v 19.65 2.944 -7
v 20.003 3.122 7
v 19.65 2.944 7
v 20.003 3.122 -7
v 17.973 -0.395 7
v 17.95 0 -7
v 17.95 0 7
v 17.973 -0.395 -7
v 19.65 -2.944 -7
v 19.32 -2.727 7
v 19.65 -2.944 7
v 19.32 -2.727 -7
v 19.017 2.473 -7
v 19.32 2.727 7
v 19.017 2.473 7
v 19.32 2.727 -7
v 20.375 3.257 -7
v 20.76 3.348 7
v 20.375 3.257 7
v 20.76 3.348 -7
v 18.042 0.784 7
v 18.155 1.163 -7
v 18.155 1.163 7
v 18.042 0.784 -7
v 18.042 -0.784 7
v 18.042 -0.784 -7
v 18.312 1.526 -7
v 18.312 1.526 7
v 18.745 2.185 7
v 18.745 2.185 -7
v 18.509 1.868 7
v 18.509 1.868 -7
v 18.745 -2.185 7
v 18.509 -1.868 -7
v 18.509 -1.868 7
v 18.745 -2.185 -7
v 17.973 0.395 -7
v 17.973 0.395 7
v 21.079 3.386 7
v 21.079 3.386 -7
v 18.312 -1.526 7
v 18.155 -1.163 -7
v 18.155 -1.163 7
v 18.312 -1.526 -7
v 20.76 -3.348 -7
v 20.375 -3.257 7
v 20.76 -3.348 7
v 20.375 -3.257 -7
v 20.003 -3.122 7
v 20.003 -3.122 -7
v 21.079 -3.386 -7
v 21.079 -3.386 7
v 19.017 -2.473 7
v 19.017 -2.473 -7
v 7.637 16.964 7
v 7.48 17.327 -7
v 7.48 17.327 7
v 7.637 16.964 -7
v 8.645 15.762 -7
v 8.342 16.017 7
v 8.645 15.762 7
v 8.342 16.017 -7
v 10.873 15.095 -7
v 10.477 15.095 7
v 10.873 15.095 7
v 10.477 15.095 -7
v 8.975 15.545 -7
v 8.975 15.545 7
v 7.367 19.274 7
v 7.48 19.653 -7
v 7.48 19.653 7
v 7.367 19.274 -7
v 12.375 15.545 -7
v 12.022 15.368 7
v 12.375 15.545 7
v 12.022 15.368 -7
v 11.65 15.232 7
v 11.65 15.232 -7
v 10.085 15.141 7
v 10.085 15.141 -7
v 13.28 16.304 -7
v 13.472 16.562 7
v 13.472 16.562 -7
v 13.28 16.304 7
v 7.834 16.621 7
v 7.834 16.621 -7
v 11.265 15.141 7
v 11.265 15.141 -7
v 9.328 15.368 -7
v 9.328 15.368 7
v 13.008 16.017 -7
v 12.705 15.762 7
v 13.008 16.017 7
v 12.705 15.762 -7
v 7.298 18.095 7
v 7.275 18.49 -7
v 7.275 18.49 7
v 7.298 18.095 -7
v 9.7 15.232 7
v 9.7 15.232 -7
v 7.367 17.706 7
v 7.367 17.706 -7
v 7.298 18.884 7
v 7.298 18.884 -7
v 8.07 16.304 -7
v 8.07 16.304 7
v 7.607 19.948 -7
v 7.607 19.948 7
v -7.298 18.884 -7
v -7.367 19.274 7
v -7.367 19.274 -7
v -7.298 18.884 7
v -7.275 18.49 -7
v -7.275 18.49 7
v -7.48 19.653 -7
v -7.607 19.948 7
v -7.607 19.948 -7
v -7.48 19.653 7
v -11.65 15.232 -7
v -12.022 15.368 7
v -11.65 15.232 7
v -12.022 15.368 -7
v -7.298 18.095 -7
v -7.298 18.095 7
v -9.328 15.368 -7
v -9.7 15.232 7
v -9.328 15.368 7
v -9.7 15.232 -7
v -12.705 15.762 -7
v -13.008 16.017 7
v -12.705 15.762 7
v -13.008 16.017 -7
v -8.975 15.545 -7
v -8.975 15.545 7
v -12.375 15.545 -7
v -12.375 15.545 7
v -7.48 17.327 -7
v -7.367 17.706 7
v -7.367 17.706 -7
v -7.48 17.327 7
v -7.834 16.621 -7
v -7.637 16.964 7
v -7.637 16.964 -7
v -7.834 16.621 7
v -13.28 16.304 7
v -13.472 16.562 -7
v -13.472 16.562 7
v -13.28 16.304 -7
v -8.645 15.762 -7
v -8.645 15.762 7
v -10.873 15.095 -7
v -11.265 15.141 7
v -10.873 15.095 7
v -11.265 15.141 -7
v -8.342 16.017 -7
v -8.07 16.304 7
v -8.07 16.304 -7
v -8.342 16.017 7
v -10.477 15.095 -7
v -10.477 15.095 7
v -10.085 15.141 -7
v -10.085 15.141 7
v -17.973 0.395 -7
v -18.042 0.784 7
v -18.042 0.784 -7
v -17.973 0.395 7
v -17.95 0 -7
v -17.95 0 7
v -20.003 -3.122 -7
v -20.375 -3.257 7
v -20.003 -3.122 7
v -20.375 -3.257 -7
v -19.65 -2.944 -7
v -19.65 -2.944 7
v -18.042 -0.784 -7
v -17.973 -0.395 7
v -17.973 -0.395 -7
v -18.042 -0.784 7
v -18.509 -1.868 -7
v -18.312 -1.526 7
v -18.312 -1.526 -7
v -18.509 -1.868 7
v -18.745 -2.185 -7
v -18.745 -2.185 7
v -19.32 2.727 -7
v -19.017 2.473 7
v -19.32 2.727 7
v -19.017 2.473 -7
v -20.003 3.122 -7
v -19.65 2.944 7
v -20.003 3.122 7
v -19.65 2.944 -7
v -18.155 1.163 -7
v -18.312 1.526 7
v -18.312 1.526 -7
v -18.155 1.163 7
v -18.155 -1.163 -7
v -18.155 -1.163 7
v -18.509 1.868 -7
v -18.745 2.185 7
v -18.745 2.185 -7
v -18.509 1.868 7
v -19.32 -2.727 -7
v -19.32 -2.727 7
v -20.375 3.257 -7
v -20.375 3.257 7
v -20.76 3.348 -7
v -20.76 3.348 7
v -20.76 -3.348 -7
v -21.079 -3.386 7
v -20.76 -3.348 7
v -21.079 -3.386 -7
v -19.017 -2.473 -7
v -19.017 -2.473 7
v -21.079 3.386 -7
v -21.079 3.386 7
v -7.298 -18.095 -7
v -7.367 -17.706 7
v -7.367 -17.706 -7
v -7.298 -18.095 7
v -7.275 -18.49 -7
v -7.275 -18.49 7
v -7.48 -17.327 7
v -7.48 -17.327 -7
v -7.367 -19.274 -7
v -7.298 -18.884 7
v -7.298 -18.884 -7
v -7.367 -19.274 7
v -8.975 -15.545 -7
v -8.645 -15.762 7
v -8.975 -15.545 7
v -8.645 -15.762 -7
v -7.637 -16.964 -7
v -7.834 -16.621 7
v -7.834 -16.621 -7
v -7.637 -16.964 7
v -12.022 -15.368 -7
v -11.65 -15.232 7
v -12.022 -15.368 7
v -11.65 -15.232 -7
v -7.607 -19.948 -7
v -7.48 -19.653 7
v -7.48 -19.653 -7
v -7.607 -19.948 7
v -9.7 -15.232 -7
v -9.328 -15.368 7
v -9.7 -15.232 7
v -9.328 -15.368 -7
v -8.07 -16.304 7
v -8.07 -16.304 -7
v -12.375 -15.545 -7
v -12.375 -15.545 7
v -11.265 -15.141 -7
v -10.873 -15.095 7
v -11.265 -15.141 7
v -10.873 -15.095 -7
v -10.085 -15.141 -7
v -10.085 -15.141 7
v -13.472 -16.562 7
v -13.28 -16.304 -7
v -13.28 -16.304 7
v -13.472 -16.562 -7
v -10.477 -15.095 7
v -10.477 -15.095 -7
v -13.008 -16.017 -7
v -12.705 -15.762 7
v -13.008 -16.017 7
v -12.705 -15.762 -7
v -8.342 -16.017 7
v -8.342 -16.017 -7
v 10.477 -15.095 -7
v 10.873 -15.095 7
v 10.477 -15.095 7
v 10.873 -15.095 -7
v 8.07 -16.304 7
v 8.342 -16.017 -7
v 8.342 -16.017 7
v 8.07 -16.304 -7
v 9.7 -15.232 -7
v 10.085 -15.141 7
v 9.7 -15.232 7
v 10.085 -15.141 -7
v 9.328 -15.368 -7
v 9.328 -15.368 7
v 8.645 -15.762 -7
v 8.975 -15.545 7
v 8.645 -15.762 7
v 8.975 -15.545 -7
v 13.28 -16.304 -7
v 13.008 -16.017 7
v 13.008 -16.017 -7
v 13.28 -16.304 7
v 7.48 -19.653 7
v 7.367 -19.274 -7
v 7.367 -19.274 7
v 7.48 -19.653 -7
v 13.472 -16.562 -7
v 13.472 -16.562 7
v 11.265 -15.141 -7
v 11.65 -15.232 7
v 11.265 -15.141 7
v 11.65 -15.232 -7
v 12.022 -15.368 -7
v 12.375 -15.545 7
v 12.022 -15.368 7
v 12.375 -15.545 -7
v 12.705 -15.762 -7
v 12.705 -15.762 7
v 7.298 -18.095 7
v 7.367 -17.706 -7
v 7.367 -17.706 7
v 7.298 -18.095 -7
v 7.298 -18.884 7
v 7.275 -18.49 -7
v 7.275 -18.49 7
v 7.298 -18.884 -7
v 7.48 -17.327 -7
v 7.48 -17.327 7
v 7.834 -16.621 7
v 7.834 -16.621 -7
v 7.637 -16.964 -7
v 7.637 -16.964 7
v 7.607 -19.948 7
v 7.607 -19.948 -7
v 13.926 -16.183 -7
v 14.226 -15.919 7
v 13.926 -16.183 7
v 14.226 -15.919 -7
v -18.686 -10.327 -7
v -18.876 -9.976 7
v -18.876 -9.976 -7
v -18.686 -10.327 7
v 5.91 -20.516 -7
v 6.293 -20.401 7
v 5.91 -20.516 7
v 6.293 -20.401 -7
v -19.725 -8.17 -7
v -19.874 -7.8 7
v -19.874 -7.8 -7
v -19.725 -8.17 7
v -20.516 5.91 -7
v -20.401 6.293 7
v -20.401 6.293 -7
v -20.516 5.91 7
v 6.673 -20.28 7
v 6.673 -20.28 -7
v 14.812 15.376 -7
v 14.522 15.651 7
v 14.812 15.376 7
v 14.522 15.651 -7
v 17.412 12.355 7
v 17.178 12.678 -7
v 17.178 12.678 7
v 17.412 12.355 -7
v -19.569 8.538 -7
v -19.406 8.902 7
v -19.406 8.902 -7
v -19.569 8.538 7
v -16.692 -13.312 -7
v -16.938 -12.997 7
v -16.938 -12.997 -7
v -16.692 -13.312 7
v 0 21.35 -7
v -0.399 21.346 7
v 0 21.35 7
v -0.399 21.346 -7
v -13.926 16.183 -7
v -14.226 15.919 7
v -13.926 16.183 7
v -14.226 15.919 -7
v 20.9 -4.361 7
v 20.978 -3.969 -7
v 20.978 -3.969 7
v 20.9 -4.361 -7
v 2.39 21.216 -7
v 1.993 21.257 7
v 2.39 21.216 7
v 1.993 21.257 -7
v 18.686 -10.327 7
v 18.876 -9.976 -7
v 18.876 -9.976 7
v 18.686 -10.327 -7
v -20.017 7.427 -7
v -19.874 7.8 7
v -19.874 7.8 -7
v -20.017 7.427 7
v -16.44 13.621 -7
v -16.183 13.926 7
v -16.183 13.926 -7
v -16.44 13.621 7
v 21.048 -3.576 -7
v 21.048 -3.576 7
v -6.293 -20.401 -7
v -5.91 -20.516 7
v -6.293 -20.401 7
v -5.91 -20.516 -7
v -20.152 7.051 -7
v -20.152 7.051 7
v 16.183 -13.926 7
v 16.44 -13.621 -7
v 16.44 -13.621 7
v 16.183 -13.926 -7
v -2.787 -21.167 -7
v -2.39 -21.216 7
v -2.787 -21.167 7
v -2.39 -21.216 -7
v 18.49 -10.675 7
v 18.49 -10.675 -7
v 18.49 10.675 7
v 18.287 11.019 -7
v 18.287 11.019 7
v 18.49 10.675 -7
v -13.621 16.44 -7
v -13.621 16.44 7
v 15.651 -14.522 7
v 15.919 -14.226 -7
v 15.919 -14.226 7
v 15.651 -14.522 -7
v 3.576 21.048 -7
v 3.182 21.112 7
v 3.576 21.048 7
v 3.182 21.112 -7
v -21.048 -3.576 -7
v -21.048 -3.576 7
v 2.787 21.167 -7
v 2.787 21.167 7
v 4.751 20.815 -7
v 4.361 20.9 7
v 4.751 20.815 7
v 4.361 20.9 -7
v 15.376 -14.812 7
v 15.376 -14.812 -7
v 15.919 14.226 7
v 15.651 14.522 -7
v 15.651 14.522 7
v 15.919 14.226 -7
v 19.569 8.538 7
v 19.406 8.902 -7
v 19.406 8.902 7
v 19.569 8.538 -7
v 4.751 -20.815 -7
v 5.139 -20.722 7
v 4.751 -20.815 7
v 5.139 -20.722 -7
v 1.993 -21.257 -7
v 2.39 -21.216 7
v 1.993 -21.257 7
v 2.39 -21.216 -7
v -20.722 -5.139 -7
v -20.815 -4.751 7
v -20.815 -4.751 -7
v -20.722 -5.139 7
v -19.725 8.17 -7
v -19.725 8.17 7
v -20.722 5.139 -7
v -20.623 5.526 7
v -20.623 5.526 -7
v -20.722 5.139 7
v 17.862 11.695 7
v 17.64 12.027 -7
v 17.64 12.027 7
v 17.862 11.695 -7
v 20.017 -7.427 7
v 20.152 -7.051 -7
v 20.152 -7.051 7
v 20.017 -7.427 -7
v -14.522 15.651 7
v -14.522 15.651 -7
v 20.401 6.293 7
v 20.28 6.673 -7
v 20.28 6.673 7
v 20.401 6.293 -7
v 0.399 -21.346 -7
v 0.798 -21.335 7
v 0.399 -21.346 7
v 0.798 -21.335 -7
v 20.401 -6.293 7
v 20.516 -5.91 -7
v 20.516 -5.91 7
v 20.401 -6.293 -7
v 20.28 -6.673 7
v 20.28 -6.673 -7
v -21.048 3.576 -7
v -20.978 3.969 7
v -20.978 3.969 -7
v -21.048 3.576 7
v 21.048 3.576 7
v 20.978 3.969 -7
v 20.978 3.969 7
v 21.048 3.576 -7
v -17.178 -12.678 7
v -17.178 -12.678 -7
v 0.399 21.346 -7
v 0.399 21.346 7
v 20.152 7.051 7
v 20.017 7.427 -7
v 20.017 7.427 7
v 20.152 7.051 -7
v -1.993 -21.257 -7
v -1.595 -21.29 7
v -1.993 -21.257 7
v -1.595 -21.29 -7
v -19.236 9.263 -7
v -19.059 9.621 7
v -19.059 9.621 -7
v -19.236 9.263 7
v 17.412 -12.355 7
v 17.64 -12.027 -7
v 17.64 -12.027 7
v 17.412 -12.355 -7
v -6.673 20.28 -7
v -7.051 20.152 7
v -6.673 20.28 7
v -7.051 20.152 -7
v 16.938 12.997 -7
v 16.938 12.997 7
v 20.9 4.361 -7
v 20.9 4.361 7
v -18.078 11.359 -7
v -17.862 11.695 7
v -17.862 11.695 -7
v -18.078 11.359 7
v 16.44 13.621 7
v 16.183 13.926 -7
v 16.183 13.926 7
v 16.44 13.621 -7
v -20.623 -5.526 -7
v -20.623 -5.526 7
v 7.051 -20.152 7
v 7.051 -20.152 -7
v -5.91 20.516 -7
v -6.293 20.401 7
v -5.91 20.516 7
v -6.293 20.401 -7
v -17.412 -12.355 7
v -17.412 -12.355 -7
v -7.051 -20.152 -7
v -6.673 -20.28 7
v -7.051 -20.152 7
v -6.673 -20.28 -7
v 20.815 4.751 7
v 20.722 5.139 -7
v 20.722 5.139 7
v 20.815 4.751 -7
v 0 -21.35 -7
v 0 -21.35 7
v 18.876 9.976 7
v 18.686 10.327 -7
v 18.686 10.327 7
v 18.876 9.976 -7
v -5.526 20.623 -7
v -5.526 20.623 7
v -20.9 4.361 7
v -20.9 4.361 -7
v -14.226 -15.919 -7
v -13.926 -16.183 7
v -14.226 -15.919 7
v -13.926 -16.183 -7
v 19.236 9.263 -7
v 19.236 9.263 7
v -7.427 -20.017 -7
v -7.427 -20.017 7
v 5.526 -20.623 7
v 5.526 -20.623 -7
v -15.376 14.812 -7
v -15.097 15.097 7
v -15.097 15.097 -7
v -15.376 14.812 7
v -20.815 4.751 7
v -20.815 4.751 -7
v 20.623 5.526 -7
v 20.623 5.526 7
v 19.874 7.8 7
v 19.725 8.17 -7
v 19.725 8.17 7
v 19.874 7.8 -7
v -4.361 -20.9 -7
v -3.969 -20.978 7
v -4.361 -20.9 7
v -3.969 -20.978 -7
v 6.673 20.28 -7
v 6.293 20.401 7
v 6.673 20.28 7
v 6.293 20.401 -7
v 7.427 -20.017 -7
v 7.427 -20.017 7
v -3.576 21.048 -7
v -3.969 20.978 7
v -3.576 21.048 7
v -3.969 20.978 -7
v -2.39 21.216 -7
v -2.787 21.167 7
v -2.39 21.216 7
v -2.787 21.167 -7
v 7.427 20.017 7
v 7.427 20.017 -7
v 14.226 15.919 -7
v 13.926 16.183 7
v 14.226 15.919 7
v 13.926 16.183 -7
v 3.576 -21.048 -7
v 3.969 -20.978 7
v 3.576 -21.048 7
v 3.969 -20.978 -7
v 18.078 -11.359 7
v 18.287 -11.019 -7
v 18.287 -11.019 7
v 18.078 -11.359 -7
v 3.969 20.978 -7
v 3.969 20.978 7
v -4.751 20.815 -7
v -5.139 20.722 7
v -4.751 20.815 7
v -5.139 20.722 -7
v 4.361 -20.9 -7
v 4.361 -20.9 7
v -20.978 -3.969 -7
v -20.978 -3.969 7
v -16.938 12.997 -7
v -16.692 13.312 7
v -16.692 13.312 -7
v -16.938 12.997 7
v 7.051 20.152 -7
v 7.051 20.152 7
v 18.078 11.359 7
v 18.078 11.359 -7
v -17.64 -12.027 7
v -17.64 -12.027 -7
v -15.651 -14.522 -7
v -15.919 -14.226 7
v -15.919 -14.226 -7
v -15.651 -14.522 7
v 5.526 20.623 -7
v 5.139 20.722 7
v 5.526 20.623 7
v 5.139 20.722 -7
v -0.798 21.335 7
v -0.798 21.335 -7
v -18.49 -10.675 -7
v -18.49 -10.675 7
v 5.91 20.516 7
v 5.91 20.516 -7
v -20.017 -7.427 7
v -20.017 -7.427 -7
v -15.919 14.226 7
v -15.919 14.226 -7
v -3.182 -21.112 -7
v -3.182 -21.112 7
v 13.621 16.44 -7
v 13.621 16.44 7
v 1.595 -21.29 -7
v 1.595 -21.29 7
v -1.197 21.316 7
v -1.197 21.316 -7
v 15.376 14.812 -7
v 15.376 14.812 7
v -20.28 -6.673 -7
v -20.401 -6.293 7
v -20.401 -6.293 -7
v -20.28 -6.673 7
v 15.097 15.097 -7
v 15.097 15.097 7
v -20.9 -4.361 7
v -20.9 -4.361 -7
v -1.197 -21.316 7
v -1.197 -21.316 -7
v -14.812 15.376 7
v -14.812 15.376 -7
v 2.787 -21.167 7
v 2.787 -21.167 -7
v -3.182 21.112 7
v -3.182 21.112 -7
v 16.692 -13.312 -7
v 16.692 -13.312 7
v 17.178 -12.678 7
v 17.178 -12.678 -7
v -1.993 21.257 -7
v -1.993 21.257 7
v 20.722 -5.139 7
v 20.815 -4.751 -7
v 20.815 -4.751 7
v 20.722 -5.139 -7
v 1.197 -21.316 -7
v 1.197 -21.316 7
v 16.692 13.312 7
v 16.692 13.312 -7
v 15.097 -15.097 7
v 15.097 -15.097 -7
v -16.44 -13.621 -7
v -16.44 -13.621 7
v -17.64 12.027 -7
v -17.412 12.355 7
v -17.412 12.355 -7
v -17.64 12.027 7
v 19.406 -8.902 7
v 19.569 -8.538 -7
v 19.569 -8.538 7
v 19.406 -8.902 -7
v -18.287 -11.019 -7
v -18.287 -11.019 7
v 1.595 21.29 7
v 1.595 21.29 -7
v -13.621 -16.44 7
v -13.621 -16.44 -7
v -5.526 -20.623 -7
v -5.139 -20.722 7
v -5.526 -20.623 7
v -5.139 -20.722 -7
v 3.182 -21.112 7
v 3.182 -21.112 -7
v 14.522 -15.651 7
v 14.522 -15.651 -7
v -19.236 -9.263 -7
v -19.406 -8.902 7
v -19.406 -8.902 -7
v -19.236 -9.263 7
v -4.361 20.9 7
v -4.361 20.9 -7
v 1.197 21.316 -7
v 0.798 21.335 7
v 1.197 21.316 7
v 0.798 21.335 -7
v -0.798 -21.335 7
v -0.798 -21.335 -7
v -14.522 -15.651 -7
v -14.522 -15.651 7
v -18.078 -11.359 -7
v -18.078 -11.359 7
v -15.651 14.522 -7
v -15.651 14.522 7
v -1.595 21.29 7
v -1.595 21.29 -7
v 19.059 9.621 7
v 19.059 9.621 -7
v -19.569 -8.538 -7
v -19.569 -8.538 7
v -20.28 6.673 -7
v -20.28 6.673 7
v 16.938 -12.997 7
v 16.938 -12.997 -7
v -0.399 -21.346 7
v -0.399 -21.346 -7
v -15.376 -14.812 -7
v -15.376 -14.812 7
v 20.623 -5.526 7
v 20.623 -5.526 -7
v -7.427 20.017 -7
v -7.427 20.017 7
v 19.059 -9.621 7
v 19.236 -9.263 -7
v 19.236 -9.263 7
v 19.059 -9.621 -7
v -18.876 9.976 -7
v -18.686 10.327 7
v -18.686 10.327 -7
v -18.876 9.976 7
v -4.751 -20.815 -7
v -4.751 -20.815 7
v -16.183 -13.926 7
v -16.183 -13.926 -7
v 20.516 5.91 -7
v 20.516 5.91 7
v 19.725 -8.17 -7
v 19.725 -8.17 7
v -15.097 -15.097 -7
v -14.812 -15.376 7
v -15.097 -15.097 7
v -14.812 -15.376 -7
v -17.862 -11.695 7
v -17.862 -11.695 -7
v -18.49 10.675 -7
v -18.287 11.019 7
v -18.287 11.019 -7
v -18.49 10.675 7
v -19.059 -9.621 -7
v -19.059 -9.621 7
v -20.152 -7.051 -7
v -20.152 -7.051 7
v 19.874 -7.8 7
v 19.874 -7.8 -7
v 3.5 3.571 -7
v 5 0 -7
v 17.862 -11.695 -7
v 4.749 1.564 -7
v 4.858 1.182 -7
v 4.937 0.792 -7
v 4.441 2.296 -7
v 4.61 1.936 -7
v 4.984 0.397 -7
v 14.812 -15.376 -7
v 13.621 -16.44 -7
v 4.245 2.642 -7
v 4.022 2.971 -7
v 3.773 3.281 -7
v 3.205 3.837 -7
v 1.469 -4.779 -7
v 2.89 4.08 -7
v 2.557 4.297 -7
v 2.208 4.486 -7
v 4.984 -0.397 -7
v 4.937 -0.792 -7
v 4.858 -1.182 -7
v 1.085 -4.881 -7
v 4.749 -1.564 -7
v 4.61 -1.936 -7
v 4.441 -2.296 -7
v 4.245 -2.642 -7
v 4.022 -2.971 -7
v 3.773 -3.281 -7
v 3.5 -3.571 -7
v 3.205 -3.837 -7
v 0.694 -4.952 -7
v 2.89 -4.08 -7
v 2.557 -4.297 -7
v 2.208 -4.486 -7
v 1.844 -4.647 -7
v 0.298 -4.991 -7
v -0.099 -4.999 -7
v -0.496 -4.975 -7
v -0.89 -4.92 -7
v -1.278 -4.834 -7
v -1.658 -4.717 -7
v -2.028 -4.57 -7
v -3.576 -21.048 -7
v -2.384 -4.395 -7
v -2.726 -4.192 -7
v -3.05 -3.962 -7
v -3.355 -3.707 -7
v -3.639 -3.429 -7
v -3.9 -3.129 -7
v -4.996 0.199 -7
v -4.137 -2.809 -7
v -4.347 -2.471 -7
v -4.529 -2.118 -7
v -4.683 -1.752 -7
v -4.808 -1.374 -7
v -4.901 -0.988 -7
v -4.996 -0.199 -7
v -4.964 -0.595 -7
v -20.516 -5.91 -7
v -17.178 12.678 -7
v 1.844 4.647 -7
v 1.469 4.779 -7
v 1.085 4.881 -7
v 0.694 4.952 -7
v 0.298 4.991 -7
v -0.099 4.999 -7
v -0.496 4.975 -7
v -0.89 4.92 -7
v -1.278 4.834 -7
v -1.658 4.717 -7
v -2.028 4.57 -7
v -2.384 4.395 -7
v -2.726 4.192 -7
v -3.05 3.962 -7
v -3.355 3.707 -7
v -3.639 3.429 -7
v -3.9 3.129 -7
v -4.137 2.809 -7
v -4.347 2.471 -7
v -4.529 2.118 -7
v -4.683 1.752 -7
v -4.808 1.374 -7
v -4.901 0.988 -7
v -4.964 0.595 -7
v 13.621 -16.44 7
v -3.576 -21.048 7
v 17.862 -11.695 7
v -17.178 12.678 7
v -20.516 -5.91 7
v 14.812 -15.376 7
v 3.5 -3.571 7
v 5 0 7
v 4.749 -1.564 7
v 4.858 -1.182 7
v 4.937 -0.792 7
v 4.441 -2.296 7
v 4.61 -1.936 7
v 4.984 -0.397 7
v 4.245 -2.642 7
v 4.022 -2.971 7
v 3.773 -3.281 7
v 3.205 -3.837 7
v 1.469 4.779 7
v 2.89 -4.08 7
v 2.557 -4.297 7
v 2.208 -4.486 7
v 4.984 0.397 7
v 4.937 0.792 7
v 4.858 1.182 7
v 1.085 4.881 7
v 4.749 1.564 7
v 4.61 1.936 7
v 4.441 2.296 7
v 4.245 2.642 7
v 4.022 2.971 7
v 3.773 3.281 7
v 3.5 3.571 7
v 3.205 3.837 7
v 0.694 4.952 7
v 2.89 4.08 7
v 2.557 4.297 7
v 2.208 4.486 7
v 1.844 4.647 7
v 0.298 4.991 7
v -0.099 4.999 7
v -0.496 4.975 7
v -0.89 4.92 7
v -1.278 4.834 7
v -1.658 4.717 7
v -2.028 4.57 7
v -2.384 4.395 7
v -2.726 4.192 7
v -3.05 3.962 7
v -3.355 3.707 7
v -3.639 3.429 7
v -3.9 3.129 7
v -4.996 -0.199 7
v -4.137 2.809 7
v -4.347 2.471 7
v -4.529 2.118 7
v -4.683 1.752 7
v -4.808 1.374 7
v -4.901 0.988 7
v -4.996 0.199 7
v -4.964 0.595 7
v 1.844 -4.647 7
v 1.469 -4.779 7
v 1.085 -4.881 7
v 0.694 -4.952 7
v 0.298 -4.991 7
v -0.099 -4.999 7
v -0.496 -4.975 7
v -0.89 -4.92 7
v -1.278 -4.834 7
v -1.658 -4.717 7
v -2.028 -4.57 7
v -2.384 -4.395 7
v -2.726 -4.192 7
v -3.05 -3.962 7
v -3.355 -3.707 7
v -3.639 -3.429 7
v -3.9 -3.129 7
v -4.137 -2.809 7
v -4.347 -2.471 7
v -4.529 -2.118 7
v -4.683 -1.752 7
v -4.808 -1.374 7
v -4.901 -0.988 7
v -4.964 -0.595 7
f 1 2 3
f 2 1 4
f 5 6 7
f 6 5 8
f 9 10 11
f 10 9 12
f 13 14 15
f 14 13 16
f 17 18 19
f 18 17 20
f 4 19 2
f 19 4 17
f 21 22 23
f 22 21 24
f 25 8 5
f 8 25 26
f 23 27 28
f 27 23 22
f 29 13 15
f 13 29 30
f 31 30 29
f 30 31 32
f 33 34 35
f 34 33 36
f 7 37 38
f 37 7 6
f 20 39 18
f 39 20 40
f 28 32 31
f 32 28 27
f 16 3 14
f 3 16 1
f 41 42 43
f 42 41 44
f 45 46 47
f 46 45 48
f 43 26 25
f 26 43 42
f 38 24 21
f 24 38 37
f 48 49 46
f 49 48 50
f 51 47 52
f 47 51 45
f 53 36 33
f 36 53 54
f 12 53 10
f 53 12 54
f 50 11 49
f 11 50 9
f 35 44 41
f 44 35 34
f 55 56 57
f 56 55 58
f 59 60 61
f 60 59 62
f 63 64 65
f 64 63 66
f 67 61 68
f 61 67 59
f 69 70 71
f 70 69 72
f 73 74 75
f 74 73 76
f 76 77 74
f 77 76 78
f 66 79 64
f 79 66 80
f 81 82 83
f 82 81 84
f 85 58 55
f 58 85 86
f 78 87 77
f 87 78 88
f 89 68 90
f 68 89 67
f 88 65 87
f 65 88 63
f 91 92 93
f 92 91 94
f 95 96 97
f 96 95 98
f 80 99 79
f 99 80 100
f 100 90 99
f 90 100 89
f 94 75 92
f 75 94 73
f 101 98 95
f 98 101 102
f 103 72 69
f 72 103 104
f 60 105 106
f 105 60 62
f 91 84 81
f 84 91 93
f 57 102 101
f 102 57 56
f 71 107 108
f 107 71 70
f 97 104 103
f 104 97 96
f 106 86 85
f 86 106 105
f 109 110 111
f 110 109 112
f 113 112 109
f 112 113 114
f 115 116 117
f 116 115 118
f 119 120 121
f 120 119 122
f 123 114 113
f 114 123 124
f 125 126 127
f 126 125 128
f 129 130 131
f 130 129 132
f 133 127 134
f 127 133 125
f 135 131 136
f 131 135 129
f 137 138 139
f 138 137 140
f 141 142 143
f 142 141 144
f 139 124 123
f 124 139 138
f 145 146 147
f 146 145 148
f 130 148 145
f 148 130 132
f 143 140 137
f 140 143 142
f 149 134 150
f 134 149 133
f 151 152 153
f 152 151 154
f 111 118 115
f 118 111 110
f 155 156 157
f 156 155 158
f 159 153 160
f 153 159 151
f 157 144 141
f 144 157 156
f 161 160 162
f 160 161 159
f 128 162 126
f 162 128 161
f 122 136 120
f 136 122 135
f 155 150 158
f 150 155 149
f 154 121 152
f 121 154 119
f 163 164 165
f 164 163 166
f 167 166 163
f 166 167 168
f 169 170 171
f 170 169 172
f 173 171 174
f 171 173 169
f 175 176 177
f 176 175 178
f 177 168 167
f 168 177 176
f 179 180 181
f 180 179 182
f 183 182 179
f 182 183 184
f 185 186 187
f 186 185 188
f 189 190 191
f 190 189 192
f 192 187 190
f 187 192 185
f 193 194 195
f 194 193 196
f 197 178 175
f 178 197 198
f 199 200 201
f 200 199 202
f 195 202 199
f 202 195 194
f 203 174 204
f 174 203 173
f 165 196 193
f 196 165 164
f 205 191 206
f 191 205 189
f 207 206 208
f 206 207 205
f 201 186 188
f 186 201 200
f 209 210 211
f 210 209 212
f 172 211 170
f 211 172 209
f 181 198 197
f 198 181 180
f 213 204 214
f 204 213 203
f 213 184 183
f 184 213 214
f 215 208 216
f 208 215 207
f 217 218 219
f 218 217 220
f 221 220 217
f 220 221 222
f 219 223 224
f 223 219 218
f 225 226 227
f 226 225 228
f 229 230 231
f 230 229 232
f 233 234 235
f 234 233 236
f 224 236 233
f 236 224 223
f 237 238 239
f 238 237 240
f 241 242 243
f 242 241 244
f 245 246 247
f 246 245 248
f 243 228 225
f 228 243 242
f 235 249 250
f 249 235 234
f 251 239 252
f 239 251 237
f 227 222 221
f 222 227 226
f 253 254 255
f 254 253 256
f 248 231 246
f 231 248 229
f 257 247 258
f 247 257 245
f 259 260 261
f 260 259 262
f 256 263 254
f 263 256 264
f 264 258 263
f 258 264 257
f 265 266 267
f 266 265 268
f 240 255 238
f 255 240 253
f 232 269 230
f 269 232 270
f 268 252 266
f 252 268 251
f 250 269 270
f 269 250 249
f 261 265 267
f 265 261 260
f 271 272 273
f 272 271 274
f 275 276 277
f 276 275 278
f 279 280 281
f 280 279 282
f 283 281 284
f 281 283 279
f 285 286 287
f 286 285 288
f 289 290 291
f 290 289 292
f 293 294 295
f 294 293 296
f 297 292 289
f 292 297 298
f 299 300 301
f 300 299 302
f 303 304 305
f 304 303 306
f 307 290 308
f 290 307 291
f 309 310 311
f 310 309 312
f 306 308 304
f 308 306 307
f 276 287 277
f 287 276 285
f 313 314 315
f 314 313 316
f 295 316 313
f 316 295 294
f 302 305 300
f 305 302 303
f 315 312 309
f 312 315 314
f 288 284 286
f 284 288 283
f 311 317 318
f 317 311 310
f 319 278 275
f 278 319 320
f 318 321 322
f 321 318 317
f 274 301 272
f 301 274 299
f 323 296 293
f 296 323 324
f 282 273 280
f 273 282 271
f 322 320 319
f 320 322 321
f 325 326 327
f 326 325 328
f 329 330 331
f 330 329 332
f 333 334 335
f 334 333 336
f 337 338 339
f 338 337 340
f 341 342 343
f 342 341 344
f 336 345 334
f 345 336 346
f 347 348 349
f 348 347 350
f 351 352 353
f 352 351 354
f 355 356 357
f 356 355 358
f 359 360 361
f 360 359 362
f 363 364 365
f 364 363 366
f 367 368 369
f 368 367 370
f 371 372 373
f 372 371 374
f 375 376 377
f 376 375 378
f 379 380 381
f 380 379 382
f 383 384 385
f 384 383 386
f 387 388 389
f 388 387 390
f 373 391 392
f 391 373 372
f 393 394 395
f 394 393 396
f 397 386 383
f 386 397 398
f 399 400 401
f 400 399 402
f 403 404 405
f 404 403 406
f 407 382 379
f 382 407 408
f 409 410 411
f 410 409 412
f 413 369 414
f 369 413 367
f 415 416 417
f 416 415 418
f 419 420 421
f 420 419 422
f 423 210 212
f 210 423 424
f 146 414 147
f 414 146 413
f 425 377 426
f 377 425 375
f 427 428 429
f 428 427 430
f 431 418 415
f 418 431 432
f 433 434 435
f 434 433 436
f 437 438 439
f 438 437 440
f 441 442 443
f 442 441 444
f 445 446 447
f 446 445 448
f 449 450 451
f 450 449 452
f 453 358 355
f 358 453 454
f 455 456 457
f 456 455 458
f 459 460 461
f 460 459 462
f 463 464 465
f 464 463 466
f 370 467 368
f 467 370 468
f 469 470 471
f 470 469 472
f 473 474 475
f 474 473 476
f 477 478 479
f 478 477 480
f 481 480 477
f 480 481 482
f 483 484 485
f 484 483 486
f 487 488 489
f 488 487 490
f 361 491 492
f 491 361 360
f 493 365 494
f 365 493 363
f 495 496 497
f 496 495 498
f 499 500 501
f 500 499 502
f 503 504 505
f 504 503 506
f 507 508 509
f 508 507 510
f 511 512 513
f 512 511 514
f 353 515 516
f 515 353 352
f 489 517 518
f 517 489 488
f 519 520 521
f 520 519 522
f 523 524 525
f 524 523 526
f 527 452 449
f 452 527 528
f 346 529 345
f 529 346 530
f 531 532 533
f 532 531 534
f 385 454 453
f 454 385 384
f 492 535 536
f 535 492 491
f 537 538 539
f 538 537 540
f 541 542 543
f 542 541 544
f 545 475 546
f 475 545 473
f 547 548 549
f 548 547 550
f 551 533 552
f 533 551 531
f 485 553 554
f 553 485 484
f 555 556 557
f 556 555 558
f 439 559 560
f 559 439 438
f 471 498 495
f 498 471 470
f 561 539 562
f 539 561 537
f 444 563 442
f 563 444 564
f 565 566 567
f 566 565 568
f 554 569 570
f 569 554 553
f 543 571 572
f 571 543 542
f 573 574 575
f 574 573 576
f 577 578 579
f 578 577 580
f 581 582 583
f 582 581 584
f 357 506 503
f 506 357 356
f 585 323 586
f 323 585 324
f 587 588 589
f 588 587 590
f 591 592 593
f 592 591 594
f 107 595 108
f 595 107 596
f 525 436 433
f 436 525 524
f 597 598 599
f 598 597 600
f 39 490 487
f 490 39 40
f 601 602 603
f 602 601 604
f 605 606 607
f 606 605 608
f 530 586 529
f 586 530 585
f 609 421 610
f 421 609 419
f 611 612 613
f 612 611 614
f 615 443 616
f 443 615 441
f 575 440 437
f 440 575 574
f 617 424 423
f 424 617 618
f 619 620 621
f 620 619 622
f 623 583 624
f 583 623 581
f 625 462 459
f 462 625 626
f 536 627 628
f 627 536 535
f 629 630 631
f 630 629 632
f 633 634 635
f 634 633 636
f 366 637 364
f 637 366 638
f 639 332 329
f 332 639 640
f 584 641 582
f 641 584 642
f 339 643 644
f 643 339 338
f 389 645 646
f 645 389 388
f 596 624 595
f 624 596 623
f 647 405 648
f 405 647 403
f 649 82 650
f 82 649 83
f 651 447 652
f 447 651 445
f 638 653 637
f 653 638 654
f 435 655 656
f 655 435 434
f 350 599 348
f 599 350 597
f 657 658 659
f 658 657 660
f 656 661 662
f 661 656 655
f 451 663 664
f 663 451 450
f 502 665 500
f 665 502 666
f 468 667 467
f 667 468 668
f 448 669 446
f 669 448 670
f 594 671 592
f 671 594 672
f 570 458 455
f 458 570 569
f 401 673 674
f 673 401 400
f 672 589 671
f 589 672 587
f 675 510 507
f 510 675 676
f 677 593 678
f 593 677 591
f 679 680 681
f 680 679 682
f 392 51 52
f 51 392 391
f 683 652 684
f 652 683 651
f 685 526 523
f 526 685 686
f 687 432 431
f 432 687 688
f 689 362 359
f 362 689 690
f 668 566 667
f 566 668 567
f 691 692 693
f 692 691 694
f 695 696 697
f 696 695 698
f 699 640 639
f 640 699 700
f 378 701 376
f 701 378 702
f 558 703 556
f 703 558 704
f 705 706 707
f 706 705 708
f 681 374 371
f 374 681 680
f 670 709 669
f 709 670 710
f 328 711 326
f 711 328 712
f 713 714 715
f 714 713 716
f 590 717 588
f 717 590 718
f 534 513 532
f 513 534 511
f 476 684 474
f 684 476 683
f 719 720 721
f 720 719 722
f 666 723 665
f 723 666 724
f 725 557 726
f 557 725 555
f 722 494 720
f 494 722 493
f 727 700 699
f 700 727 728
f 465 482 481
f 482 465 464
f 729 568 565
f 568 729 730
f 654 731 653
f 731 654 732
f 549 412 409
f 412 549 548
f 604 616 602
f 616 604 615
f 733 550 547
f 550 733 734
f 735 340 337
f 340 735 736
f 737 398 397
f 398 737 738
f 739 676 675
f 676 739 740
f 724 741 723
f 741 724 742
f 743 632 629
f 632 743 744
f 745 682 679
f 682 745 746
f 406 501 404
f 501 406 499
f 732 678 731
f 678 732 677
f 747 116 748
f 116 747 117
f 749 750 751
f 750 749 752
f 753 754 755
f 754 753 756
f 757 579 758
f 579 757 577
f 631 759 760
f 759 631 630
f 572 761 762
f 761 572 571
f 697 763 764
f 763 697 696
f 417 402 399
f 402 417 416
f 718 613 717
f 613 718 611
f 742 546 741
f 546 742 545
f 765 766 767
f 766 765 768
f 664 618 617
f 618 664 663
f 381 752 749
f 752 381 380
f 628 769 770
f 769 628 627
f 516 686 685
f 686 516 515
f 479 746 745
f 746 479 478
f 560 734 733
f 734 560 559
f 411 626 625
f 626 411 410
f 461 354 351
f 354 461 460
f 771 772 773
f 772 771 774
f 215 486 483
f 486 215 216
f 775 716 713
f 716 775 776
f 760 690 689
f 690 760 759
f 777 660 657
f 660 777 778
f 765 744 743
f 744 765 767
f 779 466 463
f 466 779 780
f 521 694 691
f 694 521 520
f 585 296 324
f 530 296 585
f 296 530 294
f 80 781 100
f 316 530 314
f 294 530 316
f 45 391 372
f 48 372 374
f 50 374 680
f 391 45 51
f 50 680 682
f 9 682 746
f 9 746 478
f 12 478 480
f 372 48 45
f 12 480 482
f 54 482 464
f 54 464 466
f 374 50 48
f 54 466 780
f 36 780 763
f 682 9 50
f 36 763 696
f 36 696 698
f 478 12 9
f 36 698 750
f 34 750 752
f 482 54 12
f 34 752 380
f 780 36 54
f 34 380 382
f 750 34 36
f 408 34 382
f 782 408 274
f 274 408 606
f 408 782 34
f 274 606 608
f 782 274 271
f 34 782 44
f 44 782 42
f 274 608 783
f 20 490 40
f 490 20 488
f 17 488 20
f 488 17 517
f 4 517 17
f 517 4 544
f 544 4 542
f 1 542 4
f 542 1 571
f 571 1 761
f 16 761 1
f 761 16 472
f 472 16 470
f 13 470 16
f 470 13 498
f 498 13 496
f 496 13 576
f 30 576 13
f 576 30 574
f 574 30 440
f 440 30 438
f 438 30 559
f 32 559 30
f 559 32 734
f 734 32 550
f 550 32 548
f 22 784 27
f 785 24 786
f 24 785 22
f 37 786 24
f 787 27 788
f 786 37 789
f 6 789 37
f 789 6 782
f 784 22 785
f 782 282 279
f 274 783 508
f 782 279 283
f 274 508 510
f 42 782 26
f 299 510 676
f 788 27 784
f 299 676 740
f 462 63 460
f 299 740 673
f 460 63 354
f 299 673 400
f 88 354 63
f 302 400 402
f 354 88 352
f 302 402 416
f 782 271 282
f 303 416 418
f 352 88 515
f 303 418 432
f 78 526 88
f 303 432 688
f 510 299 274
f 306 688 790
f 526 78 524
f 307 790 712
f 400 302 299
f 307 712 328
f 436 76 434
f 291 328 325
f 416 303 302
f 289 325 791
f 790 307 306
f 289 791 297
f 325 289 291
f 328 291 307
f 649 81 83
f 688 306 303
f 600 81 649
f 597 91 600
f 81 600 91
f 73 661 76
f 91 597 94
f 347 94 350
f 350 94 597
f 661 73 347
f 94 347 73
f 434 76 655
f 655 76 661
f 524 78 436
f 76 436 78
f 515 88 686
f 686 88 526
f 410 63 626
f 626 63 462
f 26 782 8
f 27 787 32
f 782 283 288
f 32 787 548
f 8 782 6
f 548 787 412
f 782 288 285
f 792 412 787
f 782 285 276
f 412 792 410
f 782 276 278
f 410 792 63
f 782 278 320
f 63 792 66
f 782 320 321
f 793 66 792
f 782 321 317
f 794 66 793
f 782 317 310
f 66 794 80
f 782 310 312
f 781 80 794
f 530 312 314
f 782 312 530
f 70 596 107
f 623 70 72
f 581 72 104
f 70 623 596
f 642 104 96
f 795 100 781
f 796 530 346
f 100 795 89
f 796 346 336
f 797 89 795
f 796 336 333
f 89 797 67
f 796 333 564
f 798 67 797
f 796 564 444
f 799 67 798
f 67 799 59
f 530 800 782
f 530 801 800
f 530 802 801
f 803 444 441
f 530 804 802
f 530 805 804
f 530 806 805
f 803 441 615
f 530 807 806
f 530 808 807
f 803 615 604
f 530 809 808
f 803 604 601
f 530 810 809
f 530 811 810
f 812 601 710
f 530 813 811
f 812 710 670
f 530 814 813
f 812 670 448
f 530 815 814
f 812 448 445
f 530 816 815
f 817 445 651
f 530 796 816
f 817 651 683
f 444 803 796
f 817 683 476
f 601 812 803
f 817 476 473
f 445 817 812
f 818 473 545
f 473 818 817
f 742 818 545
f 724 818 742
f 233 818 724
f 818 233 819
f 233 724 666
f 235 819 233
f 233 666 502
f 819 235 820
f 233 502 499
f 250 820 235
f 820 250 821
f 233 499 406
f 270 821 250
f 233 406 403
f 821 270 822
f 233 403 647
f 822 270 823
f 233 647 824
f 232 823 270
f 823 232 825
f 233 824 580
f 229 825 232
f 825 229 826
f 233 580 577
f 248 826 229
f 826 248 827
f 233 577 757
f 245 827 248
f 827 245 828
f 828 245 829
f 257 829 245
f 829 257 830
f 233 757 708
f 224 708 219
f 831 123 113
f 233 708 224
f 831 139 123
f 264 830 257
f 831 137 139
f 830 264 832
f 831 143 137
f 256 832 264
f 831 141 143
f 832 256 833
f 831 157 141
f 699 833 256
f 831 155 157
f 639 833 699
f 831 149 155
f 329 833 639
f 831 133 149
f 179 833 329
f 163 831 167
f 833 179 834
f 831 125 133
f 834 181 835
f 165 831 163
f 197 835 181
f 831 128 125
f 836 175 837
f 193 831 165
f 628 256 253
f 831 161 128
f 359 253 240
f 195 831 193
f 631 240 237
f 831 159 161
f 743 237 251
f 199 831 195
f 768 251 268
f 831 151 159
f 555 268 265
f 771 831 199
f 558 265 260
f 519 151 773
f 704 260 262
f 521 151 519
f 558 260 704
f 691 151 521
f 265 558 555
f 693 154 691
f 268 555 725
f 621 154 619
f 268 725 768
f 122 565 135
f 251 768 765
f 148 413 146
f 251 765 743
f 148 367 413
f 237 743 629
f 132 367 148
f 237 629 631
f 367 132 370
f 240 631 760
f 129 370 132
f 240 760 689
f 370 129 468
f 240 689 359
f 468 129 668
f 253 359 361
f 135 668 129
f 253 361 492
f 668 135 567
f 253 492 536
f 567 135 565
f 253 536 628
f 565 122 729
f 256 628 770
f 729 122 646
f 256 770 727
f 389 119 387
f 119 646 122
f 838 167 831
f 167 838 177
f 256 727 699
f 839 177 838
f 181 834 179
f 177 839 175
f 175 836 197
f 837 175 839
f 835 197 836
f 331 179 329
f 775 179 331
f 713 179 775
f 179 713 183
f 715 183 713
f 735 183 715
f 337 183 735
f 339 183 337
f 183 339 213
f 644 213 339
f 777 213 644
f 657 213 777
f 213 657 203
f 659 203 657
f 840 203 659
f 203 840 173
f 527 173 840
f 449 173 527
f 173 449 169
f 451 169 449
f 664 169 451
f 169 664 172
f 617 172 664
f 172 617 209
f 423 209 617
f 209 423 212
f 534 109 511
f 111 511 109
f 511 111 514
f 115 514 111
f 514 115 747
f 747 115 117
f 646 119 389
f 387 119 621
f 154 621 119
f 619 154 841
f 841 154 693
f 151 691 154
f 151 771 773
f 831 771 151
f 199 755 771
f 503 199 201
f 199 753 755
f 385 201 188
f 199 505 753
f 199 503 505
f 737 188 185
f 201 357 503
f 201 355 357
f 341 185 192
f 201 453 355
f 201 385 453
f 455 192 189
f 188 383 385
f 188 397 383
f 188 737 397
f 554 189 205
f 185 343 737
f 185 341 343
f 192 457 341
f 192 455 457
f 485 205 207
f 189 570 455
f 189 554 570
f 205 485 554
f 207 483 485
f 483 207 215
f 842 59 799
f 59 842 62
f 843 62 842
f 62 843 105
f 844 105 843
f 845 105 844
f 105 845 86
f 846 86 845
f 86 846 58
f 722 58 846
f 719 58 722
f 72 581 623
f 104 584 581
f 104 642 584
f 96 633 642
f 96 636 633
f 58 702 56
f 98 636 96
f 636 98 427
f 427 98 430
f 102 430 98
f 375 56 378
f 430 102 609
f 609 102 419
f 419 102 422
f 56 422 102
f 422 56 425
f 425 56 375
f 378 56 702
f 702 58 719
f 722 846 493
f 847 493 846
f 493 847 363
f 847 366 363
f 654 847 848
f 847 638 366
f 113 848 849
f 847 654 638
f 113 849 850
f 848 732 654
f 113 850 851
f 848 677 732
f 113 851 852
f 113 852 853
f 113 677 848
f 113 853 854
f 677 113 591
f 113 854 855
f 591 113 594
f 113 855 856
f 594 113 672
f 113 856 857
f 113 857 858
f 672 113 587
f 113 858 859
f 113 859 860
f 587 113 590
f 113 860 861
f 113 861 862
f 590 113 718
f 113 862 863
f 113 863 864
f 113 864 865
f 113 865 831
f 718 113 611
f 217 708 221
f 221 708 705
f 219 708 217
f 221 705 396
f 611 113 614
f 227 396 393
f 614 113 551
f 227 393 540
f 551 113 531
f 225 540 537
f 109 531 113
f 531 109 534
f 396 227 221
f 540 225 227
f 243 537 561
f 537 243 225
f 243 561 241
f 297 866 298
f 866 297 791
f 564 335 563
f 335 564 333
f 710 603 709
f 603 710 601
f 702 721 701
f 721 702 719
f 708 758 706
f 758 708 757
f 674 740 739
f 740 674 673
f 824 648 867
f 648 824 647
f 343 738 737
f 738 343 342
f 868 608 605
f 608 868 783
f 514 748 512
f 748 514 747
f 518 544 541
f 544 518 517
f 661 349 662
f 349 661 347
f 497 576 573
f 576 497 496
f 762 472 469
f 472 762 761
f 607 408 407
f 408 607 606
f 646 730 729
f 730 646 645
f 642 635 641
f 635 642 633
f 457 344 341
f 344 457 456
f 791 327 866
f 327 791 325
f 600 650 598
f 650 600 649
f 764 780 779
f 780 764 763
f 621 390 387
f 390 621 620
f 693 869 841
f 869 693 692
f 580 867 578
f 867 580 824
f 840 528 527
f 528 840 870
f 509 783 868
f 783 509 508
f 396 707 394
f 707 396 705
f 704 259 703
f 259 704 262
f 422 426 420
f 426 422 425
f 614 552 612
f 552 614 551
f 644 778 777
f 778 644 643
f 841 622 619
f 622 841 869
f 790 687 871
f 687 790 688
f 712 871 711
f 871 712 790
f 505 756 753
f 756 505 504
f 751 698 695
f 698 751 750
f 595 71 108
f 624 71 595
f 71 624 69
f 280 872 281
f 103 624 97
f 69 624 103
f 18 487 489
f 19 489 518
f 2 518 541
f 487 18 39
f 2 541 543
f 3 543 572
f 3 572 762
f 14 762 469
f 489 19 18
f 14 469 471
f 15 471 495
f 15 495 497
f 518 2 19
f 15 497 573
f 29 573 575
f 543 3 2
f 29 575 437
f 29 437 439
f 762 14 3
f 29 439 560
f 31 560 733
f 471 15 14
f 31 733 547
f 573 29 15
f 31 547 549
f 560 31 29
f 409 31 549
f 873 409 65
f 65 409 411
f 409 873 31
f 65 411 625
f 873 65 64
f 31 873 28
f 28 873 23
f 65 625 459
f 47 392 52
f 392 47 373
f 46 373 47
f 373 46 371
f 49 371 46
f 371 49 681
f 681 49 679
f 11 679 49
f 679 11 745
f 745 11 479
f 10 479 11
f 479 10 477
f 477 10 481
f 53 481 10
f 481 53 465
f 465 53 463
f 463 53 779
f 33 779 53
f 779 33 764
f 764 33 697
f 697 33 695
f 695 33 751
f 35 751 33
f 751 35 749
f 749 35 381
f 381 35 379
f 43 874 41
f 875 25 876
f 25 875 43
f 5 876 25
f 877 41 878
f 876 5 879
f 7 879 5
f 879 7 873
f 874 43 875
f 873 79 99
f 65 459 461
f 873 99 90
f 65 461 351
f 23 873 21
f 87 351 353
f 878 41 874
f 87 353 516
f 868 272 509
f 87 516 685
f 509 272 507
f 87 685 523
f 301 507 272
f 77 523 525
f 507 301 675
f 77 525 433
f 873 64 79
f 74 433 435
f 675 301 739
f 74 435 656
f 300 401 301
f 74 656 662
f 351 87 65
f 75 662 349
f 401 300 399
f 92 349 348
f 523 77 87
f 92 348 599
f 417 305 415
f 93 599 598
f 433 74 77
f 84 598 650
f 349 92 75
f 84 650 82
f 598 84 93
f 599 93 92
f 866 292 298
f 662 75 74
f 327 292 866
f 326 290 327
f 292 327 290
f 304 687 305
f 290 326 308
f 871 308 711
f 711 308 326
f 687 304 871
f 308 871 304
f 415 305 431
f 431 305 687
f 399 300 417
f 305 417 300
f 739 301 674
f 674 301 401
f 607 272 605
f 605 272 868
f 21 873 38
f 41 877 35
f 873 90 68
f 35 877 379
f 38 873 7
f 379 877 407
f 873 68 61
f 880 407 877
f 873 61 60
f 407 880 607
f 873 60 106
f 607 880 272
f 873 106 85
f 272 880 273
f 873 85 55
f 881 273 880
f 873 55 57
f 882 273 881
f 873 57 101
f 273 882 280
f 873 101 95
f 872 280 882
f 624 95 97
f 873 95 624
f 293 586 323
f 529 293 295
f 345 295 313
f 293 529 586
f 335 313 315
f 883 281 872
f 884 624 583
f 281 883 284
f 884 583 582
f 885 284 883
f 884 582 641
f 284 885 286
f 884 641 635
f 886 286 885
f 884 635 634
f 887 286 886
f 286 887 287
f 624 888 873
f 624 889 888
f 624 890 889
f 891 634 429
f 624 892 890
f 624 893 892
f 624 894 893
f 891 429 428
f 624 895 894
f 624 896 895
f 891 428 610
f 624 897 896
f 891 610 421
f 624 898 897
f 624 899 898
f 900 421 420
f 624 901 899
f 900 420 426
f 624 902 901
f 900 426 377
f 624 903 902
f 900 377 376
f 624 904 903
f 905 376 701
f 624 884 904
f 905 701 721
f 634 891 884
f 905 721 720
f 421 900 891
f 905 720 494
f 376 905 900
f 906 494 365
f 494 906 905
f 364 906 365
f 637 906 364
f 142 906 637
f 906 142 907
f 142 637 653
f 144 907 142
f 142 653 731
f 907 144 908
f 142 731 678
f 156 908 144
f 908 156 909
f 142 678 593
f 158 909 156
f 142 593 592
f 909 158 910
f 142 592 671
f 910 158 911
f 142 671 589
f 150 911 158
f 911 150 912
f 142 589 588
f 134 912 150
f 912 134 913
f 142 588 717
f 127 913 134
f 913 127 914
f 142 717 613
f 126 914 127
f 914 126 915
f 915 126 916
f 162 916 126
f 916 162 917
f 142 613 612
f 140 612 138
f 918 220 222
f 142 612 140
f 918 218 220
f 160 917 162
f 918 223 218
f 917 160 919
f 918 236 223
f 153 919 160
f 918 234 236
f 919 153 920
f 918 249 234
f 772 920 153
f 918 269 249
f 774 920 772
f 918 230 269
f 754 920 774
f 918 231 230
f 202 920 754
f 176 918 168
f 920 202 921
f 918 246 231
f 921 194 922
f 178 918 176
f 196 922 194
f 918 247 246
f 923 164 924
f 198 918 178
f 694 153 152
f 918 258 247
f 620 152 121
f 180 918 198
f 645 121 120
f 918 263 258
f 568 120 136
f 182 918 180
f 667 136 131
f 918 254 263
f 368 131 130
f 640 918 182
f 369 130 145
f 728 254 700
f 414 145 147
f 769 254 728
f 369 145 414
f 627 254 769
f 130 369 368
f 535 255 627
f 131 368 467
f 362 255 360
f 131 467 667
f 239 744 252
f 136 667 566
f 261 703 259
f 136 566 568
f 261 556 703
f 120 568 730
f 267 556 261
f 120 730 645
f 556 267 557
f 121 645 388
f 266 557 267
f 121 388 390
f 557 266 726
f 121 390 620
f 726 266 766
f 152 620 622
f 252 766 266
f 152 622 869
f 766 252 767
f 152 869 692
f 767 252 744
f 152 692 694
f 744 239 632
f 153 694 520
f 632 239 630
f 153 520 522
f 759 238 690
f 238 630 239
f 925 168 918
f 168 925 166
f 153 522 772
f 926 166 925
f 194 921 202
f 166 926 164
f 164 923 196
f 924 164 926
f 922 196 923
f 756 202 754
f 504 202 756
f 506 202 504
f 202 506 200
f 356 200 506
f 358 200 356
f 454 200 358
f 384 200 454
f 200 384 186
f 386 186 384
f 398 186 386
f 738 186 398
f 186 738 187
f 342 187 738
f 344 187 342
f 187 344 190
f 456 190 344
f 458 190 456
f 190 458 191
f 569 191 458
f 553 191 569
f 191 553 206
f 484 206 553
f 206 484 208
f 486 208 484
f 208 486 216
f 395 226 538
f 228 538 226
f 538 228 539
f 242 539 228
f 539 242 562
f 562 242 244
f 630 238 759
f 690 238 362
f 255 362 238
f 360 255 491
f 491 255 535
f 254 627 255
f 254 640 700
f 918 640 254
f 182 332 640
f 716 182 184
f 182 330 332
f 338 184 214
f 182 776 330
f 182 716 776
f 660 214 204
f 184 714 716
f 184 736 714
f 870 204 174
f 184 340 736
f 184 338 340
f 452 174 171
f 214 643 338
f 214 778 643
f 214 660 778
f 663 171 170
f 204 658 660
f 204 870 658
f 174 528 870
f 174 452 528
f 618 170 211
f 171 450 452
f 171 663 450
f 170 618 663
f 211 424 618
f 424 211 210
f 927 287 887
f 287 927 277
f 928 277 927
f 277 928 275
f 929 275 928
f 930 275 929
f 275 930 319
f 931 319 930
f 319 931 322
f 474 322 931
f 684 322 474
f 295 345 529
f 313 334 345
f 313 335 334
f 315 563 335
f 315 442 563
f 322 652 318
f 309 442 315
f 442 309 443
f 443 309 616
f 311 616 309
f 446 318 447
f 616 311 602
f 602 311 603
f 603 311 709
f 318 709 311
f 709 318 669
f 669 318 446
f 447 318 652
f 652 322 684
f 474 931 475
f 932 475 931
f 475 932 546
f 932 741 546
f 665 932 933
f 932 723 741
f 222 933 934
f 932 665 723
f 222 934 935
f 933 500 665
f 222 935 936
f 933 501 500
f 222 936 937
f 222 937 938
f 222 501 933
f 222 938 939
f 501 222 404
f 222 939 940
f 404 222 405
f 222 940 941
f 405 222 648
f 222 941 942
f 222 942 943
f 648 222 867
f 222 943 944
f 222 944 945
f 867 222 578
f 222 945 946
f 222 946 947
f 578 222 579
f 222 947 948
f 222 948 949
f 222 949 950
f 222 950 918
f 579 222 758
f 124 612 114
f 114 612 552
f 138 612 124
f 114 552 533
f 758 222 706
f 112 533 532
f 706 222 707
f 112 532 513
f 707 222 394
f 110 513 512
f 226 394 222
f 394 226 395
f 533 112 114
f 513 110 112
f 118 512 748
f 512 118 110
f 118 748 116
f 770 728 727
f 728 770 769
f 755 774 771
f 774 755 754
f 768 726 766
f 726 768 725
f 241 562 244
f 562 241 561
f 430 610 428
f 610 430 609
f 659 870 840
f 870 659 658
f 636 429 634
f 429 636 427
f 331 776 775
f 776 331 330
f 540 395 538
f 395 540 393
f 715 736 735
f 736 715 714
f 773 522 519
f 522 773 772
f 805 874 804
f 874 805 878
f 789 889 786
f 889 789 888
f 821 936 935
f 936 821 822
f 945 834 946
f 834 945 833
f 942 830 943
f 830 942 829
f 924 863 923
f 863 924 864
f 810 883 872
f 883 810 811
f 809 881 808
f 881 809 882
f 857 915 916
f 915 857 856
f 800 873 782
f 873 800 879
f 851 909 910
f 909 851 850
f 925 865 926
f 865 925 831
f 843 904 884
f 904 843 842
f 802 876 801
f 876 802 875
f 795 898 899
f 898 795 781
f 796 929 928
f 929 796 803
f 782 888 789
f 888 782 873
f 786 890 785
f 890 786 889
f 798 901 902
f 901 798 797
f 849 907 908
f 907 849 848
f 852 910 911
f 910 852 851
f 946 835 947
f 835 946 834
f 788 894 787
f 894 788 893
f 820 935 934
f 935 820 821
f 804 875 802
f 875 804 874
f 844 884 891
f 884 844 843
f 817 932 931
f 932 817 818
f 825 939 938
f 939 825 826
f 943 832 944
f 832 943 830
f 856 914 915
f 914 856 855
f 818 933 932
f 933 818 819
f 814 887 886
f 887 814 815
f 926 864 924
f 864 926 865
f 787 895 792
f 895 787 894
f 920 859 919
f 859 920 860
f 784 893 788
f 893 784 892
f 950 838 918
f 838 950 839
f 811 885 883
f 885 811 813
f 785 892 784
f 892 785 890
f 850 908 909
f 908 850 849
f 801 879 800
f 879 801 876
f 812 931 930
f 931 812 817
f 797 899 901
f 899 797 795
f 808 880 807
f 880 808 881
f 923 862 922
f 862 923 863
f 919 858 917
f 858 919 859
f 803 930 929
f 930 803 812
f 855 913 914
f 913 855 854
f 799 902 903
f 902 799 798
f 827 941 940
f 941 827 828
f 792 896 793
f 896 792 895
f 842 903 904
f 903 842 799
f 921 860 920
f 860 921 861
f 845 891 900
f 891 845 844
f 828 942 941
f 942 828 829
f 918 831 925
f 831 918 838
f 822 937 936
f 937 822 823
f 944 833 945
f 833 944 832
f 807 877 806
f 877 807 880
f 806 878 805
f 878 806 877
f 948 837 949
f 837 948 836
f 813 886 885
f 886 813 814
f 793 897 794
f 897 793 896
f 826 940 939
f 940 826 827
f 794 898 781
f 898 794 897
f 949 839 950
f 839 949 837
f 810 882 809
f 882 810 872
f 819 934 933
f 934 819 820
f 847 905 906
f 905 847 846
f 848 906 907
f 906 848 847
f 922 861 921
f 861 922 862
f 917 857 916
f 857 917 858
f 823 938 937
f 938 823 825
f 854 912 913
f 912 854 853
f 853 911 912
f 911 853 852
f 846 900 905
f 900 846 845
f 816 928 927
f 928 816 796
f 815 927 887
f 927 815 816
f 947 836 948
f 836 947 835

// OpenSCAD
$fa=1;
$fs=0.4;

/*
Gear is made out of two known factors. Number of teeth and measured center between what it need to grab.
It takes the number of teeth "n" and calculate the angles on a regular polugon wuth n-sides.
It uses half at the angle in a isoceles triangle and the Tooth Step to calculate the length from outer rim to center
The size of the dip should be a little bigger than half the size of it needs to grab plus some tolorance
*/
n = 6; // number of teeth
tooth_step = 21.35; // measured space between teeth
dip = 3.4; // radius of dip

thickness = 14; // how broad it is
bearing = 10; // outer diameter of ball bearing

iso = (1/n * (n-2) * 180)/2; // Calculater the angles of an polygon with n sides and takes half of that
out_r = tooth_step / (2*cos(iso)); // Use angle and distance between dips to calculate the sides of an isosceles triangle

in_r = out_r - dip; // Used for positioning the cutout. 

module cut() {
    // Cuts dips with a cylinder between each tooth
    translate([0,0,0])
        cylinder(h=thickness*2, r=out_r-in_r, center=true);
}

difference() {
    // Outer cylinder
    cylinder(h=thickness, r=out_r, center=true);
    // Calling cut module n number of times
    step = 360/n;
    for (i=[0:step:359]) {
        angle = i;
        dx = out_r*cos(angle);
        dy = out_r*sin(angle);
        translate([dx,dy,0])
            cut();
    }
    // cutout for conection rod, axle or motor pin
    translate([0,0,-2])
    cylinder(h=thickness*2, d=bearing  , center=true);
}
